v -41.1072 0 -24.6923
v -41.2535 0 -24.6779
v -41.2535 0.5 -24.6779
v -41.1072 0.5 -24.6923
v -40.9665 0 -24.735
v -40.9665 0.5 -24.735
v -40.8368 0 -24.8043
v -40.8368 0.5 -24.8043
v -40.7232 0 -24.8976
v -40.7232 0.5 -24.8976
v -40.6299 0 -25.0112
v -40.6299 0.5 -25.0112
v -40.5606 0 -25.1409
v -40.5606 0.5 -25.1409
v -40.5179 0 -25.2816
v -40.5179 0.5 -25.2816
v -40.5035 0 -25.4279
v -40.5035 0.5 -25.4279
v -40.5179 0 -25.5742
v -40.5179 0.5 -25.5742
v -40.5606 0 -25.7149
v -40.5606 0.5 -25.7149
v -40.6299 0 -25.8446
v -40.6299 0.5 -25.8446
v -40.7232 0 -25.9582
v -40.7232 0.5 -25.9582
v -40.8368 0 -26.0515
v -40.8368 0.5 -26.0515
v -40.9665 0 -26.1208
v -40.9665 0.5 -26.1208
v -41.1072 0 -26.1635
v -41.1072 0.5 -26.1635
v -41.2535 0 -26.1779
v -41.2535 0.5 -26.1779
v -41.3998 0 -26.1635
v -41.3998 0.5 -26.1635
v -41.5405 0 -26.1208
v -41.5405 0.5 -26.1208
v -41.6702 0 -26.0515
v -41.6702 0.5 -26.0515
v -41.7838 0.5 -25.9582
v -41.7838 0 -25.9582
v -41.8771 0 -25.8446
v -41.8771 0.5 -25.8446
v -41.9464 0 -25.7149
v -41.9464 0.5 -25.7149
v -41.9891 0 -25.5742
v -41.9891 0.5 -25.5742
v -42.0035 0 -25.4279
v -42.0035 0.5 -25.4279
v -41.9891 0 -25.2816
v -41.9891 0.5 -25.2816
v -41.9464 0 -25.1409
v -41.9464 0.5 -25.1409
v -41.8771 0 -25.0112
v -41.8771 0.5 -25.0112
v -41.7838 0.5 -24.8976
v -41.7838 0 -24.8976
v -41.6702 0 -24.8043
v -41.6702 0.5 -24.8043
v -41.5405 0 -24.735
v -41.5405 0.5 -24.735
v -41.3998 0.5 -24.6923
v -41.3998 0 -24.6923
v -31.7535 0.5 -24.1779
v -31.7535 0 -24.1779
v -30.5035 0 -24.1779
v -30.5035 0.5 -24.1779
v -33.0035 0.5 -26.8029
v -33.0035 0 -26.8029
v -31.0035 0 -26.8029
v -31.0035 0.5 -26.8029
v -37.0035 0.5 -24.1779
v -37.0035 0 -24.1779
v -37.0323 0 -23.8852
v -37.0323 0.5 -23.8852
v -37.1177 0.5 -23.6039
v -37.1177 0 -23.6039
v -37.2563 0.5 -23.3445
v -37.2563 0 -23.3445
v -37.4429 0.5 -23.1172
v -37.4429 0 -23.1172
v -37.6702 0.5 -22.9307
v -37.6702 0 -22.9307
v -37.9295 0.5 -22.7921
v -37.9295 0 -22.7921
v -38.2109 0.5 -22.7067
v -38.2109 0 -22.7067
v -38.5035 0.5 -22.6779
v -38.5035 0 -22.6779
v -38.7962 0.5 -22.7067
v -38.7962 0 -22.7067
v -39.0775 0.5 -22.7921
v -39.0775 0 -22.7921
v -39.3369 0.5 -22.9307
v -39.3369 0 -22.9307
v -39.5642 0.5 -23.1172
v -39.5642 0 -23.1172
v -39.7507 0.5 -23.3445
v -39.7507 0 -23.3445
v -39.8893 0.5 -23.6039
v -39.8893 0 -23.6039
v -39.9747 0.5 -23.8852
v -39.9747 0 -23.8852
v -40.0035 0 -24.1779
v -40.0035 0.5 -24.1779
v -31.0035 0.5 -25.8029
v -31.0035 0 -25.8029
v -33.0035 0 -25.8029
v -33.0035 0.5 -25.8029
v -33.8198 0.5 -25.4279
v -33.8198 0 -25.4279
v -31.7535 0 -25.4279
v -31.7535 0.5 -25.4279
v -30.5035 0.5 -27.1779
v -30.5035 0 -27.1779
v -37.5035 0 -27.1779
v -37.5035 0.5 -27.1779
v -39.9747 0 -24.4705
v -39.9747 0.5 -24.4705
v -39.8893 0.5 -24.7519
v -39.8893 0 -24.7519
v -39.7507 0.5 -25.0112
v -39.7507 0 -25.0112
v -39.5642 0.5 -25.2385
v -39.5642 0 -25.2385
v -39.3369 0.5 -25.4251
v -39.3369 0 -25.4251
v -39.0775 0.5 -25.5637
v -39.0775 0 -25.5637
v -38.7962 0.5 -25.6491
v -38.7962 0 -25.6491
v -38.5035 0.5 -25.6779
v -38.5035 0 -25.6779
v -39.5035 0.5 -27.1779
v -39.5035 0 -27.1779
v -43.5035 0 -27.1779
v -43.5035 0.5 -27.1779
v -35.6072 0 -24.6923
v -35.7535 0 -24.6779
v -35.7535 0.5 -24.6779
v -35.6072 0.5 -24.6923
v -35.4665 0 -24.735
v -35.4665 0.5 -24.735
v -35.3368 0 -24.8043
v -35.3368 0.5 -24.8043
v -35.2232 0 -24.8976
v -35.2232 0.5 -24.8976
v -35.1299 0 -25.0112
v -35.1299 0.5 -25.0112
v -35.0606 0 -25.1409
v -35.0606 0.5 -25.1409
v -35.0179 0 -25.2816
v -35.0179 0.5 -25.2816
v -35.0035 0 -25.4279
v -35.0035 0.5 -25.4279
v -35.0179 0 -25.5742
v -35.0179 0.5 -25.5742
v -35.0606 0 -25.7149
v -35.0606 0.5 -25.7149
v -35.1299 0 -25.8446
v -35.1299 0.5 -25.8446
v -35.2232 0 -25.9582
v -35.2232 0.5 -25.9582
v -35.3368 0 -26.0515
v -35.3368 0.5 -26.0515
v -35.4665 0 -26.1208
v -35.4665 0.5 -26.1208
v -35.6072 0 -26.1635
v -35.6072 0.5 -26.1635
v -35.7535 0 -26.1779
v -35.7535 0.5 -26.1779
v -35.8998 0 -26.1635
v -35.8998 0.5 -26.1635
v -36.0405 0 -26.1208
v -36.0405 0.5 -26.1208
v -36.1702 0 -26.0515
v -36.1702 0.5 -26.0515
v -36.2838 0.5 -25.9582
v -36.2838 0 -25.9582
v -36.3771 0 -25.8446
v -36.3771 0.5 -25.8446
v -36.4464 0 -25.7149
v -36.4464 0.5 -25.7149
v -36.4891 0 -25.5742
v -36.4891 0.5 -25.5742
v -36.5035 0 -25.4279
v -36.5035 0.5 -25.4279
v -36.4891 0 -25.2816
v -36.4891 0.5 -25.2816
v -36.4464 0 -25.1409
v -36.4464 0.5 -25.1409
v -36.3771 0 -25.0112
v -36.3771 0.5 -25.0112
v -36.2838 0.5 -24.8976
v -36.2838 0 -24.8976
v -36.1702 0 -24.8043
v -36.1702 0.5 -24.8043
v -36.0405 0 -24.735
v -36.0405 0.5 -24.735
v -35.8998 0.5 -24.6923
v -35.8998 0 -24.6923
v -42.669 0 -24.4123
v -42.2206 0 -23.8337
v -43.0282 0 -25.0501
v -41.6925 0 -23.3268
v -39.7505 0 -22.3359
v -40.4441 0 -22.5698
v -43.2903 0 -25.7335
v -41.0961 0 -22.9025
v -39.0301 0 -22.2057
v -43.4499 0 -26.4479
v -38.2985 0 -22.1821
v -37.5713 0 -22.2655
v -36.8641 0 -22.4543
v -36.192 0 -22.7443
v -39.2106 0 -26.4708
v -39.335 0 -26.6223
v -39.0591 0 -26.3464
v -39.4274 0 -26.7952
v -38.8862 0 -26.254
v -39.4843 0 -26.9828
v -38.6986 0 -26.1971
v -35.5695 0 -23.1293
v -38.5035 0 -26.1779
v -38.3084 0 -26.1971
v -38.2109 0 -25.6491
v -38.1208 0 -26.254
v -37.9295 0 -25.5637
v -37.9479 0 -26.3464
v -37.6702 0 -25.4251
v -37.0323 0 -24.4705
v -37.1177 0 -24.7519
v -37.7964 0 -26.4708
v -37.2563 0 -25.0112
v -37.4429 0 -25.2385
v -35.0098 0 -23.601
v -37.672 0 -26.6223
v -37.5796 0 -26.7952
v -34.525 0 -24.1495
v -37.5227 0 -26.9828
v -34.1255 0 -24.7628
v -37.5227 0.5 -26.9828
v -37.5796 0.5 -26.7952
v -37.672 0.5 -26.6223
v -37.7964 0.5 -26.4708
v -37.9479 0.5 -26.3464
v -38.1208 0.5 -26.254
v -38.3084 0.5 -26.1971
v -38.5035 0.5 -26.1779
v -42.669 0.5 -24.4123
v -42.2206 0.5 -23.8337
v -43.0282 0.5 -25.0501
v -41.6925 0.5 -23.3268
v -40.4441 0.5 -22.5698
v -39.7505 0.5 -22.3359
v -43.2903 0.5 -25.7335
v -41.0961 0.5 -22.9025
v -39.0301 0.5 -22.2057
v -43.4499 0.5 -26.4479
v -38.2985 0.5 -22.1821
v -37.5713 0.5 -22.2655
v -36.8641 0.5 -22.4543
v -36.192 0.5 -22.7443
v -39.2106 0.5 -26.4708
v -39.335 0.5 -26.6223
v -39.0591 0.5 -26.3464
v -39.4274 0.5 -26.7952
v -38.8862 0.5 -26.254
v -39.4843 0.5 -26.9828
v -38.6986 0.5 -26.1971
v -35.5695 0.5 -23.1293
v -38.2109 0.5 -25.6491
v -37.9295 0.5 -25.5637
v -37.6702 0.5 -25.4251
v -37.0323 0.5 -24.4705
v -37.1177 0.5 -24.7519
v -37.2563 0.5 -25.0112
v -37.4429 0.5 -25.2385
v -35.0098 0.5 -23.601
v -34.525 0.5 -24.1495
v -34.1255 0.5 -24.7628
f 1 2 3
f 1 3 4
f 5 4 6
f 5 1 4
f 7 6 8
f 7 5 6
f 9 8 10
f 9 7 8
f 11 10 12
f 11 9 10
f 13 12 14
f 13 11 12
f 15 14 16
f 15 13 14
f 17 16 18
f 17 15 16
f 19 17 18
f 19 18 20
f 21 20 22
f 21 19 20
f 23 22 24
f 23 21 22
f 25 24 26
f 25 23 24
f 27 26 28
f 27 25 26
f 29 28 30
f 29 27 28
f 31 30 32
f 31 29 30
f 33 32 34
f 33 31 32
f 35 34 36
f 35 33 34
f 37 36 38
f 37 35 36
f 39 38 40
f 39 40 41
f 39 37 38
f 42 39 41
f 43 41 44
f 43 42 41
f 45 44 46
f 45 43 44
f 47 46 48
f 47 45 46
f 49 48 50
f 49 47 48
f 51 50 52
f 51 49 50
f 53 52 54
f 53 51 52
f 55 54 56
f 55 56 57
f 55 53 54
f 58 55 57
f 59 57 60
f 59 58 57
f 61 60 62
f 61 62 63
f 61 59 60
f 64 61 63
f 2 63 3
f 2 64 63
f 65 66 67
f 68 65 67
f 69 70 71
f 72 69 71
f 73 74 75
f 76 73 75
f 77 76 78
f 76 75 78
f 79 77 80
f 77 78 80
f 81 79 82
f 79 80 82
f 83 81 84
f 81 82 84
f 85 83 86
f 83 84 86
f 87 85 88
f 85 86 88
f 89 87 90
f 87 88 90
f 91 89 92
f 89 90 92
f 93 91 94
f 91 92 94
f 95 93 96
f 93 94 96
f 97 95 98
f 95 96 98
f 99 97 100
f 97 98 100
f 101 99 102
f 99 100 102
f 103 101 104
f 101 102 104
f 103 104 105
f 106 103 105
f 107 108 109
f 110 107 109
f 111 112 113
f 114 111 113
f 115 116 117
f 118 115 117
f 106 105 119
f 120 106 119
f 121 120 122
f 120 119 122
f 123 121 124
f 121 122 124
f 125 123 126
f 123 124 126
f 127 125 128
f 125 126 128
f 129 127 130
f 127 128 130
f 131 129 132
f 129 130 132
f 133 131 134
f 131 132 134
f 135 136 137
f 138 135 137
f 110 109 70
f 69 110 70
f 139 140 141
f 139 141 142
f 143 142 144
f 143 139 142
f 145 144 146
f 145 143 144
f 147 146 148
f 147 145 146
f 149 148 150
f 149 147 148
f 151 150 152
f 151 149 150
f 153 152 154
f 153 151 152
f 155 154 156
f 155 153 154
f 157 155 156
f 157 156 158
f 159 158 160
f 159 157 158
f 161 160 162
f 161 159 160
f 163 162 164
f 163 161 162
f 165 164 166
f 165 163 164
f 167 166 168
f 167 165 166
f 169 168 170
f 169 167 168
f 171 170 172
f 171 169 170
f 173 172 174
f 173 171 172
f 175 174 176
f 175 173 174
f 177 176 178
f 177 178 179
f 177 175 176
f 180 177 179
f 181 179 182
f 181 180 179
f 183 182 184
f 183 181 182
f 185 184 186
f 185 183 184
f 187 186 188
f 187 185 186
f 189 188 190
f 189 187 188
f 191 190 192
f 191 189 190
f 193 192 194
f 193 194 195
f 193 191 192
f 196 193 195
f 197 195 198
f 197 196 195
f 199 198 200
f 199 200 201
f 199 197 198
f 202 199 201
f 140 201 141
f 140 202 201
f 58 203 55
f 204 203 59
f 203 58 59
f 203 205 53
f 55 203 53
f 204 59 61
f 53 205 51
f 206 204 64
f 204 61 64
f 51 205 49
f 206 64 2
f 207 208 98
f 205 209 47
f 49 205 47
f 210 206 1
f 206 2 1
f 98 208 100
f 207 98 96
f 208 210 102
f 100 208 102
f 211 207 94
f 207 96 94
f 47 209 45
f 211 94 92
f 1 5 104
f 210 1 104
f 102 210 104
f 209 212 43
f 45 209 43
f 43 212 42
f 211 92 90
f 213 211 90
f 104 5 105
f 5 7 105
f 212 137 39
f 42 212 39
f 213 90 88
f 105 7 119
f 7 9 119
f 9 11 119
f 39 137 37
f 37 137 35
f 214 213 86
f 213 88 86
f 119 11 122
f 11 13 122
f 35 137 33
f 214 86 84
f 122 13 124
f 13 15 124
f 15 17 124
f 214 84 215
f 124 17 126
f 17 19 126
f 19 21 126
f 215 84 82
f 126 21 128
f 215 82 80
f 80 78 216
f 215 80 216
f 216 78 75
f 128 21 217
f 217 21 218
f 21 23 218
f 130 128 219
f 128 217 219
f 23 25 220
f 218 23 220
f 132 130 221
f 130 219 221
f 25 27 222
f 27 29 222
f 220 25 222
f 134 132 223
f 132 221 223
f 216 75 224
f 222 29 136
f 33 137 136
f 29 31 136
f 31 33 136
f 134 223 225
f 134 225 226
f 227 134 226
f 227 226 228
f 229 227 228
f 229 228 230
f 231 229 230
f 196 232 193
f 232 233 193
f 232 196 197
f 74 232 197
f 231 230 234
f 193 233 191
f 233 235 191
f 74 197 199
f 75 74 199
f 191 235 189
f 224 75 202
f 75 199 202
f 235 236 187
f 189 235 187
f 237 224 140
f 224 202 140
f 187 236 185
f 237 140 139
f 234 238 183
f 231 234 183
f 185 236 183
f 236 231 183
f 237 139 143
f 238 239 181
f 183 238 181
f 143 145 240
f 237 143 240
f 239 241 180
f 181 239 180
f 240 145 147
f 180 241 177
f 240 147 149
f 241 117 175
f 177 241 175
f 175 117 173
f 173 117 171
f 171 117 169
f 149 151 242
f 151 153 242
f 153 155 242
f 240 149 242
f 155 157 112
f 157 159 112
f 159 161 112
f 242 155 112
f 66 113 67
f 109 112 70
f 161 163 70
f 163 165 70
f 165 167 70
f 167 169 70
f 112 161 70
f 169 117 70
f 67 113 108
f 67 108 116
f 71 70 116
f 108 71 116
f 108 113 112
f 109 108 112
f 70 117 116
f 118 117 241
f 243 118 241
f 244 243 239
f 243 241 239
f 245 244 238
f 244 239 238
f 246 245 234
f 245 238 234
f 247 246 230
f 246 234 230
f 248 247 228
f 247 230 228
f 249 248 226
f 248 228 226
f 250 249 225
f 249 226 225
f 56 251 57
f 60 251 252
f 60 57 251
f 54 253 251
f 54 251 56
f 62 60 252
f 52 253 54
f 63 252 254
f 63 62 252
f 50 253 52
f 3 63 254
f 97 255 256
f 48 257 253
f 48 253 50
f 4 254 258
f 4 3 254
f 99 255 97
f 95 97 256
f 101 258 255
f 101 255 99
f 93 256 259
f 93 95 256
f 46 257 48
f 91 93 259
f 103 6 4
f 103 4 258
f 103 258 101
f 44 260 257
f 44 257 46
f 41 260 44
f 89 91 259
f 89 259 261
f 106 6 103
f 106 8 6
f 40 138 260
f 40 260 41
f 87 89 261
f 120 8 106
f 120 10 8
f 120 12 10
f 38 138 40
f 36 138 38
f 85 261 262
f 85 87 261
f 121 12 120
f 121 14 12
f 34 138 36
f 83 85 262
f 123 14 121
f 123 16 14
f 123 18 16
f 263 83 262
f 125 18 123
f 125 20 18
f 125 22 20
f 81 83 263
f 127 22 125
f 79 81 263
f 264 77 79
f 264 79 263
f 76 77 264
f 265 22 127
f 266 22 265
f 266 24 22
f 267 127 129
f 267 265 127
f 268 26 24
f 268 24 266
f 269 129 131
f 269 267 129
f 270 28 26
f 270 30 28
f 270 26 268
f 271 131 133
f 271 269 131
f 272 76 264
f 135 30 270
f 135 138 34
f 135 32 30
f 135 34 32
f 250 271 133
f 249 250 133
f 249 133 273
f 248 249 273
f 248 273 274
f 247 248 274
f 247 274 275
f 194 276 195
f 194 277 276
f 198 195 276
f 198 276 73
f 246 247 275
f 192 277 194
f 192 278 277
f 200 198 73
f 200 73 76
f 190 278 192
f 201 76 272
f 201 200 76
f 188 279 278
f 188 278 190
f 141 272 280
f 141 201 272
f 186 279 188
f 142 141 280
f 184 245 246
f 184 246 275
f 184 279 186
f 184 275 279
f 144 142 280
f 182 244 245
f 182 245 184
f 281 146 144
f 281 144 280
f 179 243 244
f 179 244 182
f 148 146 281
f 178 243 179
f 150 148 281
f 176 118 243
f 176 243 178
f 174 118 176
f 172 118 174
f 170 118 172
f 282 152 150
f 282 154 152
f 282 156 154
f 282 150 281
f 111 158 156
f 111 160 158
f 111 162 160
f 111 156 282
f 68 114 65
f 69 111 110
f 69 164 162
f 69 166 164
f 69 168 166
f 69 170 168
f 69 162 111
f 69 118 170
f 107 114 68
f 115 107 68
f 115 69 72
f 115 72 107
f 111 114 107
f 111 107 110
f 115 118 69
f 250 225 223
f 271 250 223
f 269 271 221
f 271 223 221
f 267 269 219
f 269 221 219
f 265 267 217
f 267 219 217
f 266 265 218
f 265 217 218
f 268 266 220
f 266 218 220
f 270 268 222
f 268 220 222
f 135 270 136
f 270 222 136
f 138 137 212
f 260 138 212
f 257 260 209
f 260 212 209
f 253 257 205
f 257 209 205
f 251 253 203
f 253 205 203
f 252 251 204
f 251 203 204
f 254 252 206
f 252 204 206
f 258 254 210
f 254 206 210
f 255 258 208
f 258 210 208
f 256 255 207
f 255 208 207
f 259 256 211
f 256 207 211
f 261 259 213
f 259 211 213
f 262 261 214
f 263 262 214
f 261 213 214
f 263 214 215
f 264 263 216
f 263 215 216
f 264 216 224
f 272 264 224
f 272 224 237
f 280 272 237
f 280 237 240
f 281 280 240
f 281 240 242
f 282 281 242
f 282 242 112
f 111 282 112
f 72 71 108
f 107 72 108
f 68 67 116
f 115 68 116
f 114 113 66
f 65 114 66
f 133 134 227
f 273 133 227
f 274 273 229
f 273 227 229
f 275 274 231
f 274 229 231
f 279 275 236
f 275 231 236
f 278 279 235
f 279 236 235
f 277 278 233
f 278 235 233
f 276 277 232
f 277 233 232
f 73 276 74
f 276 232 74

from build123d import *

# Parameters (mm, degrees)
SKETCH1_R           = 0.75
BOSS_EXTRUDE1_DEPTH = 0.5


with BuildPart() as part:
    # Sketch1 → Boss-Extrude1 (new body)
    with BuildSketch(Plane(origin=(0, 0, 0), x_dir=(1, 0, 0), z_dir=(0, 1, 0))):
        with BuildLine():
            Line((-39.503518064, 27.177881063), (-43.503518064, 27.177881063))
            ThreePointArc((-43.503518064, 27.177881063), (-39.392691136, 22.257579116), (-33.819769565, 25.427881063))
            Line((-33.819769565, 25.427881063), (-31.753518064, 25.427881063))
            Line((-31.753518064, 25.427881063), (-31.753518064, 24.177881063))
            Line((-31.753518064, 24.177881063), (-30.503518064, 24.177881063))
            Line((-30.503518064, 24.177881063), (-30.503518064, 26.302881063))
            Line((-30.503518064, 26.302881063), (-30.503518064, 27.177881063))
            Line((-30.503518064, 27.177881063), (-37.503518064, 27.177881063))
            ThreePointArc((-37.503518064, 27.177881063), (-37.796411282, 26.470774282), (-38.503518064, 26.177881063))
            ThreePointArc((-38.503518064, 26.177881063), (-39.210624845, 26.470774282), (-39.503518064, 27.177881063))
        make_face()
        with BuildLine():
            ThreePointArc((-40.003518064, 24.177881063), (-39.564178235, 25.238541235), (-38.503518064, 25.677881063))
            ThreePointArc((-38.503518064, 25.677881063), (-37.442857892, 25.238541235), (-37.003518064, 24.177881063))
            ThreePointArc((-37.003518064, 24.177881063), (-38.503518064, 22.677881063), (-40.003518064, 24.177881063))
        make_face(mode=Mode.SUBTRACT)
        with Locations((-41.253518064, 25.427881063)):
            Circle(SKETCH1_R, mode=Mode.SUBTRACT)
        with Locations((-35.753518064, 25.427881063)):
            Circle(SKETCH1_R, mode=Mode.SUBTRACT)
        Polygon((-31.003518064, 26.802881063), (-31.003518064, 26.302881063), (-31.003518064, 25.802881063), (-33.003518064, 25.802881063), (-33.003518064, 26.802881063), align=None, mode=Mode.SUBTRACT)
    extrude(amount=BOSS_EXTRUDE1_DEPTH)


solid = part.part
